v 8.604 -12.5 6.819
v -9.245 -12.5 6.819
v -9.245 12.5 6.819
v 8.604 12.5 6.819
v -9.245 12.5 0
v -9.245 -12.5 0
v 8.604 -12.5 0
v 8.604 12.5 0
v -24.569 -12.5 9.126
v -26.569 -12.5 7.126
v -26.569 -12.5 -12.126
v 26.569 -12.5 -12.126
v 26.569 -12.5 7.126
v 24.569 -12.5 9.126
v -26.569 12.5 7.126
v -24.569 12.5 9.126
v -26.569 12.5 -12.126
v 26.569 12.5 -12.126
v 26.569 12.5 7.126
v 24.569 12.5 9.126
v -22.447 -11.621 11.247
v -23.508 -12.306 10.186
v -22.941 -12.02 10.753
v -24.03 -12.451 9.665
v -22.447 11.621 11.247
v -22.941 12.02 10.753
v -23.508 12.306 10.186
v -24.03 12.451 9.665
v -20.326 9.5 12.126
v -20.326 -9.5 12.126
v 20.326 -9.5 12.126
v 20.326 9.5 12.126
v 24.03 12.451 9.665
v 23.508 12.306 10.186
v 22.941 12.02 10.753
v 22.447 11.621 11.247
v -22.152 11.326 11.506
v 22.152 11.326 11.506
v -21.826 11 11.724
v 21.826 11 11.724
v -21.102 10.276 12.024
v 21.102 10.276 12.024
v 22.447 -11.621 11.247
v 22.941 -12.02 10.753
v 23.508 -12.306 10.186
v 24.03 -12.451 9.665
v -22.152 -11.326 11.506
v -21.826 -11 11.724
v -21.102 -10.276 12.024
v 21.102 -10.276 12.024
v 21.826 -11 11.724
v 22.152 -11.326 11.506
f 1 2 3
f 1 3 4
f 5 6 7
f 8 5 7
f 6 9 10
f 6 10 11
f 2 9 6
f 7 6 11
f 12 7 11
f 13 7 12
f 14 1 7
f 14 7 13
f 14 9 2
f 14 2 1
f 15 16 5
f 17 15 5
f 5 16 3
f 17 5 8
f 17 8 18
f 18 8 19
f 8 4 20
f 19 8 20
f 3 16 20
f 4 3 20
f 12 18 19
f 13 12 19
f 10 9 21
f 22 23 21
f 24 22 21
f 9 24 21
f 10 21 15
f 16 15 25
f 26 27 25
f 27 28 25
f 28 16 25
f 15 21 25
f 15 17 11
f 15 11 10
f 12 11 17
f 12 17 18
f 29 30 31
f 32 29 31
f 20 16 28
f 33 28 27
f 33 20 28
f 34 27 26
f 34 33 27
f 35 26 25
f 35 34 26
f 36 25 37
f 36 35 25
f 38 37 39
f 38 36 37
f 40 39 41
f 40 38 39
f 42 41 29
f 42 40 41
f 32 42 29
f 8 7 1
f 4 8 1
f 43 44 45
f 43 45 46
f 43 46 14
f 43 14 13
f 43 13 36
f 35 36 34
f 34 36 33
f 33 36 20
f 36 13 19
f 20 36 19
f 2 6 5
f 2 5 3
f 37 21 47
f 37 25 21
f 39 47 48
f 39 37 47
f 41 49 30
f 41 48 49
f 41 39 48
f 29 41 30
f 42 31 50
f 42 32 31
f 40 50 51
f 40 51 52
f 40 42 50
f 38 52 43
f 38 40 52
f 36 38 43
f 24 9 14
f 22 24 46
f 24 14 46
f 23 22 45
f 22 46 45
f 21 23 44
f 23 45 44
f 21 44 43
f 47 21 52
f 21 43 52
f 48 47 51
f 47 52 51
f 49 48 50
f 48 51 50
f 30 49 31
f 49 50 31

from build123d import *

# Parameters (mm, degrees)
F0_W     = 53.1371047842
F0_H     = 24.2517590523
F1_DEPTH = 12.5
F2_W     = 17.8484022617
F2_H     = 6.8188142031
F3_DEPTH = 25
F4_SIZE  = 5
F5_R     = 3


with BuildPart() as f1:
    # F0 (on Front) → F1 (new body, symmetric)
    with BuildSketch(Plane.XZ):
        Rectangle(F0_W, F0_H)
    extrude(amount=F1_DEPTH, both=True)

    # F2 (on face) → F3 (cut)
    with BuildSketch(Plane.XZ.offset(12.5)):
        with Locations((-0.3203526139, 3.4094071016)):
            Rectangle(F2_W, F2_H)
    extrude(amount=-F3_DEPTH, mode=Mode.SUBTRACT)

    # F4
    f4_edges = [f1.edges().sort_by_distance(p)[0] for p in [
        (-26.568552, 0, 12.12588),
        (26.568552, 0, 12.12588),
    ]]
    chamfer(f4_edges, length=F4_SIZE)

    # F5
    f5_edges = [f1.edges().sort_by_distance(p)[0] for p in [
        (0, -12.5, 12.12588),
        (0, 12.5, 12.12588),
        (-21.568552, 0, 12.12588),
        (21.568552, 0, 12.12588),
    ]]
    fillet(f5_edges, radius=F5_R)


solid = f1.part
